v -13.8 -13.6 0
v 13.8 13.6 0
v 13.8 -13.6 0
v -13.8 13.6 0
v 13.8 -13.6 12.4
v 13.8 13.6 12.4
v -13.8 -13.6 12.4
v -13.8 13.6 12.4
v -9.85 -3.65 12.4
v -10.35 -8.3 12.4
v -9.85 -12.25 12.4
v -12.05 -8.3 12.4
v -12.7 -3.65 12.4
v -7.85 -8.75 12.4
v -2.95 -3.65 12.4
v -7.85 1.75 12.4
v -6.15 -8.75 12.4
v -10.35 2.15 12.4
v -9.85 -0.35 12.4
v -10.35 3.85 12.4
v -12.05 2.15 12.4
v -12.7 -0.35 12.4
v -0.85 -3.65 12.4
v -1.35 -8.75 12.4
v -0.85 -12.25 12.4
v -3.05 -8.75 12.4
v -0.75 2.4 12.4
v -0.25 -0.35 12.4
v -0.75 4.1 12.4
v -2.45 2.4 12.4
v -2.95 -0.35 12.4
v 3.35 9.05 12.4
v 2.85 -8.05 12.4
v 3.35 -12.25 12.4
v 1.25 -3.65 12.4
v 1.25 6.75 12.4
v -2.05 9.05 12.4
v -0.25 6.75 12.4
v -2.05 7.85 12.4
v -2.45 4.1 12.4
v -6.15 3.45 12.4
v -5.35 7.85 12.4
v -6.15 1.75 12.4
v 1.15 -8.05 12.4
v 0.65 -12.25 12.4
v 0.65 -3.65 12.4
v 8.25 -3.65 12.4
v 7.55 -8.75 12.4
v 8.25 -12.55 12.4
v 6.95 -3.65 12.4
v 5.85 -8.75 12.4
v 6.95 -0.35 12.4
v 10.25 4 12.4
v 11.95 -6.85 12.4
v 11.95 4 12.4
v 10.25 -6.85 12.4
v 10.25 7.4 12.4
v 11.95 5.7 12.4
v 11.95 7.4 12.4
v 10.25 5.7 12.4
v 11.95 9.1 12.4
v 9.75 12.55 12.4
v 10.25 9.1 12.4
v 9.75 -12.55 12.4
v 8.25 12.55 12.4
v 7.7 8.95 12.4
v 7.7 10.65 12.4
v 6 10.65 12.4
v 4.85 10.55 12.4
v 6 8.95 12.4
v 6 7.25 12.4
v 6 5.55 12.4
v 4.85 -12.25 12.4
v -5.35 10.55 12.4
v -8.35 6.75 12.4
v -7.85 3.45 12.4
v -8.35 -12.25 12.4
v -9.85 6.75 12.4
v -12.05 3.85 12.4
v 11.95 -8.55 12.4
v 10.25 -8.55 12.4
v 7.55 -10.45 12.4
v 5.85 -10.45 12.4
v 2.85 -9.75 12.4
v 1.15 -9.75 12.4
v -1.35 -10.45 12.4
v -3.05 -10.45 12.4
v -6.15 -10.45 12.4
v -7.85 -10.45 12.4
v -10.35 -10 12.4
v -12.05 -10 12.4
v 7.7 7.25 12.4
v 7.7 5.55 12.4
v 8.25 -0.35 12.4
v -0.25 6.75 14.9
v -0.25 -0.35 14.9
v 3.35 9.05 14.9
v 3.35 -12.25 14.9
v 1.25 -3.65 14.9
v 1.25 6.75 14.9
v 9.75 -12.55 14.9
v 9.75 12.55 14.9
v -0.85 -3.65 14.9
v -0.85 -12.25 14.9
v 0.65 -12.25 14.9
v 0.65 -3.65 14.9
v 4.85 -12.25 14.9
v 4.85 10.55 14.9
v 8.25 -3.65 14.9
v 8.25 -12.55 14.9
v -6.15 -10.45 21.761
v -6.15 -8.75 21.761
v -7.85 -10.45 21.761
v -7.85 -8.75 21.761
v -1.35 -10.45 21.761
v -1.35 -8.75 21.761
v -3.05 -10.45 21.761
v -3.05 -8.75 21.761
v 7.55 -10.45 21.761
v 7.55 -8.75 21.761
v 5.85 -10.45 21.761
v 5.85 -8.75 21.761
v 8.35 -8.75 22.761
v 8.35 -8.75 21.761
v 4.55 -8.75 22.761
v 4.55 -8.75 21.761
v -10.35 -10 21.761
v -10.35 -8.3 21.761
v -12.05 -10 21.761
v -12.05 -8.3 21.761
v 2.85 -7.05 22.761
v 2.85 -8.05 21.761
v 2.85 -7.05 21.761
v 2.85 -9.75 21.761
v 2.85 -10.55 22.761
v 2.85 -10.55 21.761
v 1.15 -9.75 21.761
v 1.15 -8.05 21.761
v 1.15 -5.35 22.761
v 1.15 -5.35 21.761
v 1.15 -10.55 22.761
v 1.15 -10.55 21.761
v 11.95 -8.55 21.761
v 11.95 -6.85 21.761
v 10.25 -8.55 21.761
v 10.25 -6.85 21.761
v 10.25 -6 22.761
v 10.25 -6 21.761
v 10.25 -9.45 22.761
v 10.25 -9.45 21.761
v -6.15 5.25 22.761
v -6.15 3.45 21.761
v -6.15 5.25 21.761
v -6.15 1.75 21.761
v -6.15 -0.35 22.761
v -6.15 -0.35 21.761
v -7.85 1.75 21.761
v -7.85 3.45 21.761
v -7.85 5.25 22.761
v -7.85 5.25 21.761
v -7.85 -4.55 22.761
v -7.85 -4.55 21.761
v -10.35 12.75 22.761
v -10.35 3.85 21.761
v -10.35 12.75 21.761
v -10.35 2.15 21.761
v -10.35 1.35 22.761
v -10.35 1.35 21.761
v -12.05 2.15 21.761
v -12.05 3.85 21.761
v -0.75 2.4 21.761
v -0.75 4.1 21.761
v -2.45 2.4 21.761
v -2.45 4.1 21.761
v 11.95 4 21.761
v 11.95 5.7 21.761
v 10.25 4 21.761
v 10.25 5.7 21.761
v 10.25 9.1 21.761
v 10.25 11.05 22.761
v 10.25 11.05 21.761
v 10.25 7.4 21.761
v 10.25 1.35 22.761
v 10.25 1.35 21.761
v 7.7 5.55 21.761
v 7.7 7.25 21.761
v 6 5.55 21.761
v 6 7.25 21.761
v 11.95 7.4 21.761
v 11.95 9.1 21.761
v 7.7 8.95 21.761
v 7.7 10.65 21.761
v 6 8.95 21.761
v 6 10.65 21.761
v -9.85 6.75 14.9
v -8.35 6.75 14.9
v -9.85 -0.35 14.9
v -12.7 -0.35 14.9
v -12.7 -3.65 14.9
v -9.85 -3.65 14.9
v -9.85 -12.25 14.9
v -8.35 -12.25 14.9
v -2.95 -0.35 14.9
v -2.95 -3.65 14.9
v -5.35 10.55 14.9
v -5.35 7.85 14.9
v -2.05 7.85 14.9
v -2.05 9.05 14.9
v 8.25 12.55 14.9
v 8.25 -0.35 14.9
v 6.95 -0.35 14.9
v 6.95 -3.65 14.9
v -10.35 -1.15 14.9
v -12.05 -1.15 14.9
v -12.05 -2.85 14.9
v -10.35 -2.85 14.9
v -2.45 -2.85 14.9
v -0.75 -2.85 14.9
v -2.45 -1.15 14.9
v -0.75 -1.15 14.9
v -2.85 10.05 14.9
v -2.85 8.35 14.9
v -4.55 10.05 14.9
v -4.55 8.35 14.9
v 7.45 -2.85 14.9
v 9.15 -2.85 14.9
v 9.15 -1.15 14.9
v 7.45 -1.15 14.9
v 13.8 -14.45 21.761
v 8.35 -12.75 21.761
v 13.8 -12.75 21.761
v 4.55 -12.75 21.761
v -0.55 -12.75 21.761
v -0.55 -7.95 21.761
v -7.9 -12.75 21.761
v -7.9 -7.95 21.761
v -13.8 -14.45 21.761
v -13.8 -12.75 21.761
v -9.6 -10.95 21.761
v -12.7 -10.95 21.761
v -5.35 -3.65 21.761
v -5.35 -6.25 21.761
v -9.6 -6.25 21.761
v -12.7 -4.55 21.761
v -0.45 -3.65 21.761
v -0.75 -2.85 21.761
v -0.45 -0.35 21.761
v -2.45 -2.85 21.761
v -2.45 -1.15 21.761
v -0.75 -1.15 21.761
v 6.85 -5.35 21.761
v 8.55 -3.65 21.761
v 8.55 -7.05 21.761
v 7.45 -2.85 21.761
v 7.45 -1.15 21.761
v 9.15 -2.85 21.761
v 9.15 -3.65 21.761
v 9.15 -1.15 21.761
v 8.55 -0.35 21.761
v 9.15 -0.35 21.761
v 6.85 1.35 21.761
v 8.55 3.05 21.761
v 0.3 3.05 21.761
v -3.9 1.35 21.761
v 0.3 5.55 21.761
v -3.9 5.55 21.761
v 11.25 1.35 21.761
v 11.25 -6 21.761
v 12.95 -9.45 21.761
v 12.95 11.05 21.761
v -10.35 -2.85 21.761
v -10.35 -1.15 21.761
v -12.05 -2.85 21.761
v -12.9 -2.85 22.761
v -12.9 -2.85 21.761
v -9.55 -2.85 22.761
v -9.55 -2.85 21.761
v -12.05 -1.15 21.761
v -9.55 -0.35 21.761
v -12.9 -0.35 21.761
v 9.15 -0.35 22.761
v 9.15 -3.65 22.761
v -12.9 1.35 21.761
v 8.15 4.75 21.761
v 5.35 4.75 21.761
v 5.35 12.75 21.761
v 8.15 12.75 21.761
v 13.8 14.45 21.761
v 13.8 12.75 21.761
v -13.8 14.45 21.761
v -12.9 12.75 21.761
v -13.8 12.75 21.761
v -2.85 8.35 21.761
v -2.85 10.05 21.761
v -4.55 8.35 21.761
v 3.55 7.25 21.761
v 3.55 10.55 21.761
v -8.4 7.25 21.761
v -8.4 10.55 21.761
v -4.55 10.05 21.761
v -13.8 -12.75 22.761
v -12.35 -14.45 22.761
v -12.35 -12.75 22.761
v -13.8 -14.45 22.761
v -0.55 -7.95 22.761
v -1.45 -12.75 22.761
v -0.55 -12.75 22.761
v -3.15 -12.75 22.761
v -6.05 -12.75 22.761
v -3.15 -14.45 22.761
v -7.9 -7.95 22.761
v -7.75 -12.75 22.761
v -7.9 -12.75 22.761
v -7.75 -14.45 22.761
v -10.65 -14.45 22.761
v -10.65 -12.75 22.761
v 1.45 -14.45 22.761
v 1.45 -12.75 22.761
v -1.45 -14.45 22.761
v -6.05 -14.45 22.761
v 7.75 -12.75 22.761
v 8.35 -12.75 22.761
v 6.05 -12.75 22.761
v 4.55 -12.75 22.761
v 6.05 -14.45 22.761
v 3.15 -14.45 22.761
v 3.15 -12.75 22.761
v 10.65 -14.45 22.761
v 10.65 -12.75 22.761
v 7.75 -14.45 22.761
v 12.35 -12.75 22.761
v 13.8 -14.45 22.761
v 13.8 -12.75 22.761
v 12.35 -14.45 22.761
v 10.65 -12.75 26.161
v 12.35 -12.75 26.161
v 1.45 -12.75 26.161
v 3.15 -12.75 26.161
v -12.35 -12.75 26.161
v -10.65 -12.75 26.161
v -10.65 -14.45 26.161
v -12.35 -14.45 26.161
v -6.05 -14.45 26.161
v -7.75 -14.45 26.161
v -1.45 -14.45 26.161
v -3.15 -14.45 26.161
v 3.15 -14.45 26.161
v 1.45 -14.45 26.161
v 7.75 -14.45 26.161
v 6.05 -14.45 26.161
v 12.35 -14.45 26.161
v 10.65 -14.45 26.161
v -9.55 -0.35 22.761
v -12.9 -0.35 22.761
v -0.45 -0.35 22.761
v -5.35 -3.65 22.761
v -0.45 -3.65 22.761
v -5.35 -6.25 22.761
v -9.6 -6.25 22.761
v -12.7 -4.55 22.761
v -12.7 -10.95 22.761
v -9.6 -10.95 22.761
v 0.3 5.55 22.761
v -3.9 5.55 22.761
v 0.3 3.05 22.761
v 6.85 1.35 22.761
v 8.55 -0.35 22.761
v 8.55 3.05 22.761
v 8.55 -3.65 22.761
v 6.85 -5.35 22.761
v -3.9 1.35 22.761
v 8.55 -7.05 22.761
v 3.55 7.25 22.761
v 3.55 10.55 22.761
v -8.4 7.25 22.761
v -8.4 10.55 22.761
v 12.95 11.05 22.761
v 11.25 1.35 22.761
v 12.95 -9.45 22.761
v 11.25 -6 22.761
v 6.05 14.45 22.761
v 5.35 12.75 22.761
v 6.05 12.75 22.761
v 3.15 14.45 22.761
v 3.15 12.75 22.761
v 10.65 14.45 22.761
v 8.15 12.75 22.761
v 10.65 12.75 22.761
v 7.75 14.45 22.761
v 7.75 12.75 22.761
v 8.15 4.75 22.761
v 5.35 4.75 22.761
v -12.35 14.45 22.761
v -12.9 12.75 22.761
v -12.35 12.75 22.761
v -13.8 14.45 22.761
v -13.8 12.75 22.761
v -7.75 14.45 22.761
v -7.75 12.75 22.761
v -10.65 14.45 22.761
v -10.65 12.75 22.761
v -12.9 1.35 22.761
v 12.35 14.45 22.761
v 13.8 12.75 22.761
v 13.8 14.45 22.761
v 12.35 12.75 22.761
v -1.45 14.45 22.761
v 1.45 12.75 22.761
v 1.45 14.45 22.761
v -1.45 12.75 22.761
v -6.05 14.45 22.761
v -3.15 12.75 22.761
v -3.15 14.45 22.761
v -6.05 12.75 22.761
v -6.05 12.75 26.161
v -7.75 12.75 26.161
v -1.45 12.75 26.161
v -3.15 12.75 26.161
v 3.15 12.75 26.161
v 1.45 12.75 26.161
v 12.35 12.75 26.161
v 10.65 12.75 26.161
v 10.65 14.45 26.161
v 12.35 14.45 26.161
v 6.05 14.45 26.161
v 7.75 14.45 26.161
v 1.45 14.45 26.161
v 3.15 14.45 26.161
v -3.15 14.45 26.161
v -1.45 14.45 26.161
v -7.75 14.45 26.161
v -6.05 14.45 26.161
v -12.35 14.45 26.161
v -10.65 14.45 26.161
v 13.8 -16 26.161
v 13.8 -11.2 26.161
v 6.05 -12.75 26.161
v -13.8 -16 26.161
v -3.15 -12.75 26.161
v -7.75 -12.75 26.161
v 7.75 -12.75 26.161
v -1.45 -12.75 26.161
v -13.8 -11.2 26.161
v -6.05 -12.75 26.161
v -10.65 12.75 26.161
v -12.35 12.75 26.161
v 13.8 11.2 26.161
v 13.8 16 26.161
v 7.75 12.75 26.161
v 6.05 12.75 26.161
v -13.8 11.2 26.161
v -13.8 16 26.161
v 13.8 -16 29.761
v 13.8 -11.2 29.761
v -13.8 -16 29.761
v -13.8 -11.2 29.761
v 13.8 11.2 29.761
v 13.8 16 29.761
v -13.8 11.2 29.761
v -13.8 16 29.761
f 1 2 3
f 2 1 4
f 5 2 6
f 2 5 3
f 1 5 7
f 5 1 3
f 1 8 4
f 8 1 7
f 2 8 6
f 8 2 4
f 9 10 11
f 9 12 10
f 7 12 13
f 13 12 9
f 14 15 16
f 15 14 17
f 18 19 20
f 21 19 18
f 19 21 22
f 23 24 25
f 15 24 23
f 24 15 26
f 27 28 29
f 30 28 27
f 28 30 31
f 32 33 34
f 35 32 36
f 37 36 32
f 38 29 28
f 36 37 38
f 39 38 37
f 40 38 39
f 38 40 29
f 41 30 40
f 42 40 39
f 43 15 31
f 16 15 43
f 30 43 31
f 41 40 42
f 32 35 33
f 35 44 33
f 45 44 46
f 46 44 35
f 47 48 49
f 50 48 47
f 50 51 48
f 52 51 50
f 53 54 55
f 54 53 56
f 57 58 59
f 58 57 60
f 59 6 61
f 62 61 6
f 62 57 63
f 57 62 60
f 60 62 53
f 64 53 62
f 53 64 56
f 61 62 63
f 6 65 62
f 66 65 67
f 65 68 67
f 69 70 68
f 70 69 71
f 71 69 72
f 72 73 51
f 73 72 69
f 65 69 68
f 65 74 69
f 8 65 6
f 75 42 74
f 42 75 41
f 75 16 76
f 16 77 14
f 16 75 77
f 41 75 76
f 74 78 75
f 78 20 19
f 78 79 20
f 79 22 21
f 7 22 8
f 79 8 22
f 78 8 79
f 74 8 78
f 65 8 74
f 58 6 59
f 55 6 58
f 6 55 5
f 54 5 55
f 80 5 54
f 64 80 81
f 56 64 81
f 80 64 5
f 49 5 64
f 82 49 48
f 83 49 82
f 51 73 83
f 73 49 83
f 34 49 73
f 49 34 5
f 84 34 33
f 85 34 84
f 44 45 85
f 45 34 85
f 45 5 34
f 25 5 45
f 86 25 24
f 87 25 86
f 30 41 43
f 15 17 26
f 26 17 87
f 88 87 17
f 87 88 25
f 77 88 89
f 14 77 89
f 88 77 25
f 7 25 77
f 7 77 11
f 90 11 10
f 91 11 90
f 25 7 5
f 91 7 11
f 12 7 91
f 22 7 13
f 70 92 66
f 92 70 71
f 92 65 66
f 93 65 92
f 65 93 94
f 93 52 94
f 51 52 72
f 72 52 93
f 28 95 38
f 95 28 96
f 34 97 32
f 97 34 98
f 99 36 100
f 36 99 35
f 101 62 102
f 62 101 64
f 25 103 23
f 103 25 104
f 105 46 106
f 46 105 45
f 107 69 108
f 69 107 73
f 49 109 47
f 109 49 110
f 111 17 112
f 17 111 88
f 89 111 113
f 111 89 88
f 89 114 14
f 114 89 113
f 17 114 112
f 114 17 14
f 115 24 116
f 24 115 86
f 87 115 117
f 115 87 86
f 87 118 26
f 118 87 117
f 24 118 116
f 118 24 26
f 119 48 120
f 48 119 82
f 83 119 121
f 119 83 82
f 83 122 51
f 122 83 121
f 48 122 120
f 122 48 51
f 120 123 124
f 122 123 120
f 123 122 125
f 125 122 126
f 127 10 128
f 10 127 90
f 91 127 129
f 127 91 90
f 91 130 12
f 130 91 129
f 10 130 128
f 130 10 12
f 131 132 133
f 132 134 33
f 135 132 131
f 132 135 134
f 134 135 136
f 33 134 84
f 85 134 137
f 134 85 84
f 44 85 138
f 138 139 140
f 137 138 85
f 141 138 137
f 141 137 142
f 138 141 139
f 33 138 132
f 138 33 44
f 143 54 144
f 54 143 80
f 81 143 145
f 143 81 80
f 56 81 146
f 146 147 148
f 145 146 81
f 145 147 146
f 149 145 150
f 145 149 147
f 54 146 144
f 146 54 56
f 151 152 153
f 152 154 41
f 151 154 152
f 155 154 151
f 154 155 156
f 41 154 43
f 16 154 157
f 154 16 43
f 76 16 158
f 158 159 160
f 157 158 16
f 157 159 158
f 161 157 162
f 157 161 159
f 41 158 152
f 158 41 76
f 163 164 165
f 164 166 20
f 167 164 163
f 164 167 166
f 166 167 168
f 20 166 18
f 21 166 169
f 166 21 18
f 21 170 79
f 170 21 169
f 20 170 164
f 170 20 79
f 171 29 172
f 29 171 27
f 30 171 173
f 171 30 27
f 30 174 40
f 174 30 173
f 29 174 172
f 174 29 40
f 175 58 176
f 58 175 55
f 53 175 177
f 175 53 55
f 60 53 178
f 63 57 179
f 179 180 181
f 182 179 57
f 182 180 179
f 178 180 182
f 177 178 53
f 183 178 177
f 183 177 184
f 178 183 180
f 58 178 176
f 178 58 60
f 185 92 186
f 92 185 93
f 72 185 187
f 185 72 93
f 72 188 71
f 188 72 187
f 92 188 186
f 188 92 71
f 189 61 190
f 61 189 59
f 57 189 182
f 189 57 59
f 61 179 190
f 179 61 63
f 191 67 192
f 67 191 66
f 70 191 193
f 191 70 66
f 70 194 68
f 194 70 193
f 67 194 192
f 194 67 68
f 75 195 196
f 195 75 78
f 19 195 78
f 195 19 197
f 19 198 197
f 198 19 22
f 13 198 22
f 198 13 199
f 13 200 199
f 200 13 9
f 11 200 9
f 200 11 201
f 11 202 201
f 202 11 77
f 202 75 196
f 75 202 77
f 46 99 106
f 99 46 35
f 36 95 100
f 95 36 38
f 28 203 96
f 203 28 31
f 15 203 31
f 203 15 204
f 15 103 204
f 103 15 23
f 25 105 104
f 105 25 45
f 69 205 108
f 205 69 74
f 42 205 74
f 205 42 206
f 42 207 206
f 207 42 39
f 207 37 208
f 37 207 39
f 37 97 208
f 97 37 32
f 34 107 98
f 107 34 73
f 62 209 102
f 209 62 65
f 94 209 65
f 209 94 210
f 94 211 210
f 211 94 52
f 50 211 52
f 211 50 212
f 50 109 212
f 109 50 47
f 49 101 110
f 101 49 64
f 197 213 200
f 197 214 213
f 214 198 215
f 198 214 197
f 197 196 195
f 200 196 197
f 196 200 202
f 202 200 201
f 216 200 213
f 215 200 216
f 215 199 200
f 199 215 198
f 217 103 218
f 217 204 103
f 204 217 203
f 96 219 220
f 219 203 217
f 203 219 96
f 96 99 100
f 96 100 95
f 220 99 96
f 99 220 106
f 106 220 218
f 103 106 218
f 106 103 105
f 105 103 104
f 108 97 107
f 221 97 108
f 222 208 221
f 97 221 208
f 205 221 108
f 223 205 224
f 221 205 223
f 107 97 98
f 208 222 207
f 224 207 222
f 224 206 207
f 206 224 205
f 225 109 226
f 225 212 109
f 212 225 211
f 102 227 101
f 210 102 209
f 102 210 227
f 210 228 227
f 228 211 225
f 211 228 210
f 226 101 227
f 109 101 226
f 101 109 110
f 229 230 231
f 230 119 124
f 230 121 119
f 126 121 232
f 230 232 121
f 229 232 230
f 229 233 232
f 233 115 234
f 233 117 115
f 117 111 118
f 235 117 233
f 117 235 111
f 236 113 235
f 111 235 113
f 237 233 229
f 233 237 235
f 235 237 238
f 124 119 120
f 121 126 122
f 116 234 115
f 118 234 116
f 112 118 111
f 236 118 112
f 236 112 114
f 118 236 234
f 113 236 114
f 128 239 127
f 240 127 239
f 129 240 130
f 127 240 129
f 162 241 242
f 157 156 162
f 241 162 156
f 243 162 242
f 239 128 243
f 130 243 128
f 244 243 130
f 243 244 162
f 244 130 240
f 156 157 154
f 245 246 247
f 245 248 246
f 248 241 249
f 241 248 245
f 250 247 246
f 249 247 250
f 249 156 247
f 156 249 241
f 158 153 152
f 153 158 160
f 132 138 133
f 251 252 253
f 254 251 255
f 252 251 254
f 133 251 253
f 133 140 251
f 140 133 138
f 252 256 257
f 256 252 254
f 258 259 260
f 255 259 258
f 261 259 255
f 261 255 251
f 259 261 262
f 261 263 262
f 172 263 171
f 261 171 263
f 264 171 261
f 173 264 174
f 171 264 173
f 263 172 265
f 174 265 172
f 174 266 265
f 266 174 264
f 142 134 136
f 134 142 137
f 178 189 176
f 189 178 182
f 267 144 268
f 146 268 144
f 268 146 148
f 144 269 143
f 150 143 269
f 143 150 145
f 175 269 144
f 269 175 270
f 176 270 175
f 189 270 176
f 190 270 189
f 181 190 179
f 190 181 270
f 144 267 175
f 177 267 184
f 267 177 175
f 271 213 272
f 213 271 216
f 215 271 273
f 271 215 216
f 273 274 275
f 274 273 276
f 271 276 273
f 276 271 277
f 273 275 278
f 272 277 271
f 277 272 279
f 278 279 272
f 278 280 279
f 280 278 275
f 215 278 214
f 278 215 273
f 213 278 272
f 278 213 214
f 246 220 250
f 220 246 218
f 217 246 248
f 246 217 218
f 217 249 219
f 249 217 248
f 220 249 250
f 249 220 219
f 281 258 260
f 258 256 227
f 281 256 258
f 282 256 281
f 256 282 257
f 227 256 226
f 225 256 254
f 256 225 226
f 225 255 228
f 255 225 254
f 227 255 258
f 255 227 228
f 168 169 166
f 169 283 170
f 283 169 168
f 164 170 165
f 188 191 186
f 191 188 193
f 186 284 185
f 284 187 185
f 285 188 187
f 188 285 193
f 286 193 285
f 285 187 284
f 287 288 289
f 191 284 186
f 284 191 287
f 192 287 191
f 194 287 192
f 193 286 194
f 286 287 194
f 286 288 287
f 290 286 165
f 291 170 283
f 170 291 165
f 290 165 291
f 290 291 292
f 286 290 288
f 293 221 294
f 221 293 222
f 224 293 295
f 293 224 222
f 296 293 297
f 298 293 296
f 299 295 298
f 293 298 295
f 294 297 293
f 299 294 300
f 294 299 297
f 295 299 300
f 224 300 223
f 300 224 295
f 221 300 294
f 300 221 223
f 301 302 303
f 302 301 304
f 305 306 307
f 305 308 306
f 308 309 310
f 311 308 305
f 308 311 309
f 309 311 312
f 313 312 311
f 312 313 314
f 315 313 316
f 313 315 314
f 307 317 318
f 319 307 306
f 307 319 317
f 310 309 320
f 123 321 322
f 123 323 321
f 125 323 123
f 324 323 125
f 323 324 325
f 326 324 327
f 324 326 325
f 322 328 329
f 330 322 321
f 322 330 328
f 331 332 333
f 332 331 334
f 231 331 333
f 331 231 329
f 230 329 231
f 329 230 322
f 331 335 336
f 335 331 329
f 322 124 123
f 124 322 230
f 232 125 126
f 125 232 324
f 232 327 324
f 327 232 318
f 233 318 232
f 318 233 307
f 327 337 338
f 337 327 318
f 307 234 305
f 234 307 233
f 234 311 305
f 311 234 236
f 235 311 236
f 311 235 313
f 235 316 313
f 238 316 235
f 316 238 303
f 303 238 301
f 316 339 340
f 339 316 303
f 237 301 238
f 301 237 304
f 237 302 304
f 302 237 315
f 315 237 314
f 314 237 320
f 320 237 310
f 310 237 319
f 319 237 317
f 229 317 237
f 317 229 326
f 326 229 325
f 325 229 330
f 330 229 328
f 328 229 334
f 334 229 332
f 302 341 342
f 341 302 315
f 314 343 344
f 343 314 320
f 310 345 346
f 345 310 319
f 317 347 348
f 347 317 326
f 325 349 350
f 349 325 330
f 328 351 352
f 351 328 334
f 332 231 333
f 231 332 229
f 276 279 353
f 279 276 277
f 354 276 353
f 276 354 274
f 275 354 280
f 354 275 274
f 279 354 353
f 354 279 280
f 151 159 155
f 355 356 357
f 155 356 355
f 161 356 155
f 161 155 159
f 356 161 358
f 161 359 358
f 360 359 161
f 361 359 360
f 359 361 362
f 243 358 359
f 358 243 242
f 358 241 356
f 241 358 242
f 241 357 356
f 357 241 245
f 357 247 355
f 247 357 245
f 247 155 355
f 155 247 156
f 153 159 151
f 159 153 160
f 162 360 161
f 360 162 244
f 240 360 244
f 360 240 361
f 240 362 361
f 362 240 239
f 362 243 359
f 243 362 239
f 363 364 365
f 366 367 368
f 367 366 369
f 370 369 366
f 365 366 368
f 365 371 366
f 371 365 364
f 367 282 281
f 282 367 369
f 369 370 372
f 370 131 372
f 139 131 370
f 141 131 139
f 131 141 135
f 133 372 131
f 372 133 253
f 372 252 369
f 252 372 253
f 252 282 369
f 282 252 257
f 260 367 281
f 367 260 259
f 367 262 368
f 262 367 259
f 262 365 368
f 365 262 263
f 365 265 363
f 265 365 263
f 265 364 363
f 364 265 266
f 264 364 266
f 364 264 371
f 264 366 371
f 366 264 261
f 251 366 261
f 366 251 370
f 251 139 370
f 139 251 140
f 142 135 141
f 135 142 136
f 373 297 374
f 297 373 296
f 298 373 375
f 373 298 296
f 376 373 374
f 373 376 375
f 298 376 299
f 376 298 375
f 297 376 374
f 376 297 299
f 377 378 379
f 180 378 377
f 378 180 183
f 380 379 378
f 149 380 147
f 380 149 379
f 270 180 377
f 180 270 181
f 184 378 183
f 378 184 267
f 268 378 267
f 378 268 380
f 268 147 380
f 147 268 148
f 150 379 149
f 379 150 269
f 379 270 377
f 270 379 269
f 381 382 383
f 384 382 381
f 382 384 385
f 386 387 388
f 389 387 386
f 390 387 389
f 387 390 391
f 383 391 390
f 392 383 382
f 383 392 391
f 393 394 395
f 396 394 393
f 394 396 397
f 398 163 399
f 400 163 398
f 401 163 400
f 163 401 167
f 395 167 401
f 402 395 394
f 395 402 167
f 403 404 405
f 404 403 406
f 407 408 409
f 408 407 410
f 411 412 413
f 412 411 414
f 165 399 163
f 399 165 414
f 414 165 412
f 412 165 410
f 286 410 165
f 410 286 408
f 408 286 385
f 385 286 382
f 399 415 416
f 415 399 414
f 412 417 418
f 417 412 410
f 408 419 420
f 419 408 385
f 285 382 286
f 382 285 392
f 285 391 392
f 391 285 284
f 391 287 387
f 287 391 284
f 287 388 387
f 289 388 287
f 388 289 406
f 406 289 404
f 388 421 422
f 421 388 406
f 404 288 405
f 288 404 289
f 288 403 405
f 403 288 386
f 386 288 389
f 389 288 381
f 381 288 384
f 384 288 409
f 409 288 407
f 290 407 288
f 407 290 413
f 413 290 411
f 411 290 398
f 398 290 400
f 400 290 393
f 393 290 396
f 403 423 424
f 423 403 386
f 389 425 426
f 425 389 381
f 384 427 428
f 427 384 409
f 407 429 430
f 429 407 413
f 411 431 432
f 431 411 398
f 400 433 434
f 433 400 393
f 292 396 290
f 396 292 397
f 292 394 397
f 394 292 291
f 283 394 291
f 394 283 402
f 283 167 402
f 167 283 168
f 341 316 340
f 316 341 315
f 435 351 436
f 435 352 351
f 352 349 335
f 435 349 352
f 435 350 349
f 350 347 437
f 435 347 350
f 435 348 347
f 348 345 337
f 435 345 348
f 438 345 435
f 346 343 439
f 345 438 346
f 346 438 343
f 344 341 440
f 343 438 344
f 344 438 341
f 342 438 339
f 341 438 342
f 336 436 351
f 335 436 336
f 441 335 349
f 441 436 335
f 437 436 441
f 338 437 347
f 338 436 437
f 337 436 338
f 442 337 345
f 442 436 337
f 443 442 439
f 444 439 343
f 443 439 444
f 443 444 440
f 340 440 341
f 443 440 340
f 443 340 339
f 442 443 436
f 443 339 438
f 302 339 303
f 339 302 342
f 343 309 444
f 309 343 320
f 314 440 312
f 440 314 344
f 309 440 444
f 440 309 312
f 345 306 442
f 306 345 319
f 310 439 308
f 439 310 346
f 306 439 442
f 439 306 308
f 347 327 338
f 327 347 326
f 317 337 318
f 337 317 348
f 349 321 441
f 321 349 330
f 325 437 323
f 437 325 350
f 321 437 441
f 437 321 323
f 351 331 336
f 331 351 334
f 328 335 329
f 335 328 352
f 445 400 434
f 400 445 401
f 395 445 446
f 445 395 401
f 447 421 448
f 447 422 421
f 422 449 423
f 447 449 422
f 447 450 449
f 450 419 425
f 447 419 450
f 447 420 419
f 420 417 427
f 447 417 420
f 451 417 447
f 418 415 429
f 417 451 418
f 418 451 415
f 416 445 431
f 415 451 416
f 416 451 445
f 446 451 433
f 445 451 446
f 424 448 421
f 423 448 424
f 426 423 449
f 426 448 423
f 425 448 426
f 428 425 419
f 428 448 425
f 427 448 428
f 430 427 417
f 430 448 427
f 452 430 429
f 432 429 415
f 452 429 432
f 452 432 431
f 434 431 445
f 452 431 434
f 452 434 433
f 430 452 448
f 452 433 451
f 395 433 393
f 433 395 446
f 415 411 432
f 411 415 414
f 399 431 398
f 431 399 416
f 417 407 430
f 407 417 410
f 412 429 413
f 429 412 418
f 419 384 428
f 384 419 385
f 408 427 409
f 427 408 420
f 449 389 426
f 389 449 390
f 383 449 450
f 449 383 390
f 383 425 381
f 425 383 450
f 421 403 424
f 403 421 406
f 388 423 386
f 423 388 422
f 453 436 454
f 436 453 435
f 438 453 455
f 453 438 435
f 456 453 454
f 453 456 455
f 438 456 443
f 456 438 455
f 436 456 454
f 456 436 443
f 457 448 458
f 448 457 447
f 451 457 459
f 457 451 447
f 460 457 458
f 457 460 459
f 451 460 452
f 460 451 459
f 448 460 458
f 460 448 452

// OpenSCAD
// Generated by SolidPython 0.4.2 on 2020-09-29 23:22:08
//!OpenSCAD

scale(v = 0.0100000000) {
	translate(v = [-1380, -1360, 0]) {
		union() {
			color(c = [0.4000000000, 0.4000000000, 0.4000000000]) {
				translate(v = [0, 0, 0]) {
					linear_extrude(height = 1000.0000000000) {
						polygon(paths = [[0, 1, 2, 3]], points = [[0, 0], [0, 2720], [2760, 2720], [2760, 0]]);
					}
				}
			}
			color(c = [0.2000000000, 0.6000000000, 0.2000000000]) {
				translate(v = [0, 0, 1000.0000000000]) {
					linear_extrude(height = 120.0000000000) {
						polygon(paths = [[0, 1, 2, 3]], points = [[0, 1305], [0, 2720], [2760, 2720], [2760, 1305]]);
					}
				}
			}
			color(c = [0.4000000000, 0.4000000000, 0.4000000000]) {
				translate(v = [0, 0, 1000.0000000000]) {
					linear_extrude(height = 120.0000000000) {
						polygon(paths = [[0, 1, 2, 3]], points = [[0, 0], [0, 1305], [2760, 1305], [2760, 0]]);
					}
				}
			}
			color(c = [0.9000000000, 0.6000000000, 0.6000000000]) {
				translate(v = [0, 0, 1120.0000000000]) {
					linear_extrude(height = 120.0000000000) {
						polygon(paths = [[0, 1, 2, 3]], points = [[135, 1485], [135, 1905], [395, 1905], [395, 1485]]);
					}
				}
			}
			color(c = [0.9000000000, 0.6000000000, 0.6000000000]) {
				translate(v = [0, 0, 1120.0000000000]) {
					linear_extrude(height = 120.0000000000) {
						polygon(paths = [[0, 1, 2, 3]], points = [[545, 1485], [545, 1905], [825, 1905], [825, 1485]]);
					}
				}
			}
			color(c = [0.9000000000, 0.6000000000, 0.6000000000]) {
				translate(v = [0, 0, 1120.0000000000]) {
					linear_extrude(height = 120.0000000000) {
						polygon(paths = [[0, 1, 2, 3]], points = [[1095, 1485], [1095, 1905], [1355, 1905], [1355, 1485]]);
					}
				}
			}
			color(c = [0.9000000000, 0.6000000000, 0.6000000000]) {
				translate(v = [0, 0, 1120.0000000000]) {
					linear_extrude(height = 120.0000000000) {
						polygon(paths = [[0, 1, 2, 3]], points = [[1505, 1485], [1505, 1905], [1715, 1905], [1715, 1485]]);
					}
				}
			}
			color(c = [0.9000000000, 0.6000000000, 0.6000000000]) {
				translate(v = [0, 0, 1120.0000000000]) {
					linear_extrude(height = 120.0000000000) {
						polygon(paths = [[0, 1, 2, 3, 4, 5]], points = [[1865, 1485], [1865, 1905], [1940, 1905], [1940, 2485], [2205, 2485], [2205, 1485]]);
					}
				}
			}
			color(c = [0.9000000000, 0.6000000000, 0.6000000000]) {
				translate(v = [0, 0, 1120.0000000000]) {
					linear_extrude(height = 120.0000000000) {
						polygon(paths = [[0, 1, 2, 3]], points = [[2355, 1485], [2355, 2485], [2625, 2485], [2625, 1485]]);
					}
				}
			}
			color(c = [0.9000000000, 0.6000000000, 0.9000000000]) {
				translate(v = [0, 0, 1120.0000000000]) {
					linear_extrude(height = 120.0000000000) {
						polygon(paths = [[0, 1, 2, 3]], points = [[135, 265], [135, 685], [395, 685], [395, 265]]);
					}
				}
			}
			color(c = [0.9000000000, 0.6000000000, 0.9000000000]) {
				translate(v = [0, 0, 1120.0000000000]) {
					linear_extrude(height = 120.0000000000) {
						polygon(paths = [[0, 1, 2, 3]], points = [[545, 265], [545, 685], [1295, 685], [1295, 265]]);
					}
				}
			}
			color(c = [0.9000000000, 0.6000000000, 0.9000000000]) {
				translate(v = [0, 0, 1120.0000000000]) {
					linear_extrude(height = 120.0000000000) {
						polygon(paths = [[0, 1, 2, 3]], points = [[1445, 265], [1445, 685], [1715, 685], [1715, 265]]);
					}
				}
			}
			color(c = [0.9000000000, 0.6000000000, 0.9000000000]) {
				translate(v = [0, 0, 1120.0000000000]) {
					linear_extrude(height = 120.0000000000) {
						polygon(paths = [[0, 1, 2, 3, 4, 5, 6, 7]], points = [[1940, 235], [1940, 265], [1865, 265], [1865, 685], [1940, 685], [1940, 885], [2205, 885], [2205, 235]]);
					}
				}
			}
			color(c = [0.9000000000, 0.6000000000, 0.9000000000]) {
				translate(v = [0, 0, 1120.0000000000]) {
					linear_extrude(height = 120.0000000000) {
						polygon(paths = [[0, 1, 2, 3]], points = [[2355, 235], [2355, 885], [2625, 885], [2625, 235]]);
					}
				}
			}
			color(c = [0.2000000000, 0.6000000000, 0.2000000000]) {
				translate(v = [0, 0, 1120.0000000000]) {
					linear_extrude(height = 120.0000000000) {
						difference() {
							polygon(paths = [[0, 1, 2, 3]], points = [[0, 1305], [0, 2720], [2760, 2720], [2760, 1305]]);
							polygon(paths = [[0, 1, 2, 3]], points = [[135, 1485], [395, 1485], [395, 1905], [135, 1905]]);
							polygon(paths = [[0, 1, 2, 3]], points = [[545, 1485], [825, 1485], [825, 1905], [545, 1905]]);
							polygon(paths = [[0, 1, 2, 3]], points = [[1095, 1485], [1355, 1485], [1355, 1905], [1095, 1905]]);
							polygon(paths = [[0, 1, 2, 3]], points = [[1505, 1485], [1715, 1485], [1715, 1905], [1505, 1905]]);
							polygon(paths = [[0, 1, 2, 3]], points = [[2355, 1485], [2625, 1485], [2625, 2485], [2355, 2485]]);
							polygon(paths = [[0, 1, 2, 3, 4, 5]], points = [[1865, 1485], [2205, 1485], [2205, 2485], [1940, 2485], [1940, 1905], [1865, 1905]]);
						}
					}
				}
			}
			color(c = [0.4000000000, 0.4000000000, 0.4000000000]) {
				translate(v = [0, 0, 1120.0000000000]) {
					linear_extrude(height = 120.0000000000) {
						difference() {
							polygon(paths = [[0, 1, 2, 3]], points = [[0, 0], [0, 1305], [2760, 1305], [2760, 0]]);
							polygon(paths = [[0, 1, 2, 3]], points = [[2355, 235], [2625, 235], [2625, 885], [2355, 885]]);
							polygon(paths = [[0, 1, 2, 3]], points = [[135, 265], [395, 265], [395, 685], [135, 685]]);
							polygon(paths = [[0, 1, 2, 3]], points = [[545, 265], [1295, 265], [1295, 685], [545, 685]]);
							polygon(paths = [[0, 1, 2, 3]], points = [[1445, 265], [1715, 265], [1715, 685], [1445, 685]]);
							polygon(paths = [[0, 1, 2, 3, 4, 5, 6, 7]], points = [[1940, 235], [2205, 235], [2205, 885], [1940, 885], [1940, 685], [1865, 685], [1865, 265], [1940, 265]]);
						}
					}
				}
			}
			color(c = [0.1000000000, 0.1000000000, 0.1000000000]) {
				translate(v = [0, 0, 1240.0000000000]) {
					linear_extrude(height = 70.0000000000) {
						polygon(paths = [[0, 1, 2, 3]], points = [[595, 315], [595, 485], [765, 485], [765, 315]]);
					}
				}
			}
			color(c = [0.1000000000, 0.1000000000, 0.1000000000]) {
				translate(v = [0, 0, 1240.0000000000]) {
					linear_extrude(height = 70.0000000000) {
						polygon(paths = [[0, 1, 2, 3]], points = [[1075, 315], [1075, 485], [1245, 485], [1245, 315]]);
					}
				}
			}
			color(c = [0.1000000000, 0.1000000000, 0.1000000000]) {
				translate(v = [0, 0, 1240.0000000000]) {
					linear_extrude(height = 70.0000000000) {
						polygon(paths = [[0, 1, 2, 3]], points = [[1965, 315], [1965, 485], [2135, 485], [2135, 315]]);
					}
				}
			}
			color(c = [0.1000000000, 0.1000000000, 0.1000000000]) {
				translate(v = [0, 0, 1240.0000000000]) {
					linear_extrude(height = 70.0000000000) {
						polygon(paths = [[0, 1, 2, 3]], points = [[175, 360], [175, 530], [345, 530], [345, 360]]);
					}
				}
			}
			color(c = [0.1000000000, 0.1000000000, 0.1000000000]) {
				translate(v = [0, 0, 1240.0000000000]) {
					linear_extrude(height = 70.0000000000) {
						polygon(paths = [[0, 1, 2, 3]], points = [[1495, 385], [1495, 555], [1665, 555], [1665, 385]]);
					}
				}
			}
			color(c = [0.1000000000, 0.1000000000, 0.1000000000]) {
				translate(v = [0, 0, 1240.0000000000]) {
					linear_extrude(height = 70.0000000000) {
						polygon(paths = [[0, 1, 2, 3]], points = [[2405, 505], [2405, 675], [2575, 675], [2575, 505]]);
					}
				}
			}
			color(c = [0.1000000000, 0.1000000000, 0.1000000000]) {
				translate(v = [0, 0, 1240.0000000000]) {
					linear_extrude(height = 70.0000000000) {
						polygon(paths = [[0, 1, 2, 3]], points = [[595, 1535], [595, 1705], [765, 1705], [765, 1535]]);
					}
				}
			}
			color(c = [0.1000000000, 0.1000000000, 0.1000000000]) {
				translate(v = [0, 0, 1240.0000000000]) {
					linear_extrude(height = 70.0000000000) {
						polygon(paths = [[0, 1, 2, 3]], points = [[175, 1575], [175, 1745], [345, 1745], [345, 1575]]);
					}
				}
			}
			color(c = [0.1000000000, 0.1000000000, 0.1000000000]) {
				translate(v = [0, 0, 1240.0000000000]) {
					linear_extrude(height = 70.0000000000) {
						polygon(paths = [[0, 1, 2, 3]], points = [[1135, 1600], [1135, 1770], [1305, 1770], [1305, 1600]]);
					}
				}
			}
			color(c = [0.1000000000, 0.1000000000, 0.1000000000]) {
				translate(v = [0, 0, 1240.0000000000]) {
					linear_extrude(height = 70.0000000000) {
						polygon(paths = [[0, 1, 2, 3]], points = [[2405, 1760], [2405, 1930], [2575, 1930], [2575, 1760]]);
					}
				}
			}
			color(c = [0.1000000000, 0.1000000000, 0.1000000000]) {
				translate(v = [0, 0, 1240.0000000000]) {
					linear_extrude(height = 70.0000000000) {
						polygon(paths = [[0, 1, 2, 3]], points = [[1980, 1915], [1980, 2085], [2150, 2085], [2150, 1915]]);
					}
				}
			}
			color(c = [0.1000000000, 0.1000000000, 0.1000000000]) {
				translate(v = [0, 0, 1240.0000000000]) {
					linear_extrude(height = 70.0000000000) {
						polygon(paths = [[0, 1, 2, 3]], points = [[2405, 2100], [2405, 2270], [2575, 2270], [2575, 2100]]);
					}
				}
			}
			color(c = [0.1000000000, 0.1000000000, 0.1000000000]) {
				translate(v = [0, 0, 1240.0000000000]) {
					linear_extrude(height = 70.0000000000) {
						polygon(paths = [[0, 1, 2, 3]], points = [[1980, 2255], [1980, 2425], [2150, 2425], [2150, 2255]]);
					}
				}
			}
			color(c = [1.0000000000, 1.0000000000, 1.0000000000]) {
				translate(v = [0, 0, 1240.0000000000]) {
					linear_extrude(height = 70.0000000000) {
						polygon(paths = [[0, 1, 2, 3, 4, 5, 6, 7]], points = [[395, 135], [395, 995], [110, 995], [110, 1325], [395, 1325], [395, 2035], [545, 2035], [545, 135]]);
					}
				}
			}
			color(c = [1.0000000000, 1.0000000000, 1.0000000000]) {
				translate(v = [0, 0, 1240.0000000000]) {
					linear_extrude(height = 70.0000000000) {
						polygon(paths = [[0, 1, 2, 3, 4, 5, 6, 7, 8, 9]], points = [[1295, 135], [1295, 995], [1085, 995], [1085, 1325], [1355, 1325], [1355, 2035], [1505, 2035], [1505, 995], [1445, 995], [1445, 135]]);
					}
				}
			}
			color(c = [1.0000000000, 1.0000000000, 1.0000000000]) {
				translate(v = [0, 0, 1240.0000000000]) {
					linear_extrude(height = 70.0000000000) {
						polygon(paths = [[0, 1, 2, 3, 4, 5, 6, 7]], points = [[1715, 135], [1715, 2265], [1175, 2265], [1175, 2145], [845, 2145], [845, 2415], [1865, 2415], [1865, 135]]);
					}
				}
			}
			color(c = [1.0000000000, 1.0000000000, 1.0000000000]) {
				translate(v = [0, 0, 1240.0000000000]) {
					linear_extrude(height = 70.0000000000) {
						polygon(paths = [[0, 1, 2, 3, 4, 5, 6, 7]], points = [[2205, 105], [2205, 995], [2075, 995], [2075, 1325], [2205, 1325], [2205, 2615], [2355, 2615], [2355, 105]]);
					}
				}
			}
			color(c = [0.1000000000, 0.1000000000, 0.1000000000]) {
				translate(v = [0, 0, 1310.0000000000]) {
					linear_extrude(height = 180.0000000000) {
						polygon(paths = [[0, 1, 2, 3]], points = [[595, 315], [595, 485], [765, 485], [765, 315]]);
					}
				}
			}
			color(c = [0.1000000000, 0.1000000000, 0.1000000000]) {
				translate(v = [0, 0, 1310.0000000000]) {
					linear_extrude(height = 180.0000000000) {
						polygon(paths = [[0, 1, 2, 3]], points = [[1075, 315], [1075, 485], [1245, 485], [1245, 315]]);
					}
				}
			}
			color(c = [0.1000000000, 0.1000000000, 0.1000000000]) {
				translate(v = [0, 0, 1310.0000000000]) {
					linear_extrude(height = 180.0000000000) {
						polygon(paths = [[0, 1, 2, 3]], points = [[1965, 315], [1965, 485], [2135, 485], [2135, 315]]);
					}
				}
			}
			color(c = [0.1000000000, 0.1000000000, 0.1000000000]) {
				translate(v = [0, 0, 1310.0000000000]) {
					linear_extrude(height = 180.0000000000) {
						polygon(paths = [[0, 1, 2, 3]], points = [[175, 360], [175, 530], [345, 530], [345, 360]]);
					}
				}
			}
			color(c = [0.1000000000, 0.1000000000, 0.1000000000]) {
				translate(v = [0, 0, 1310.0000000000]) {
					linear_extrude(height = 180.0000000000) {
						polygon(paths = [[0, 1, 2, 3]], points = [[1495, 385], [1495, 555], [1665, 555], [1665, 385]]);
					}
				}
			}
			color(c = [0.1000000000, 0.1000000000, 0.1000000000]) {
				translate(v = [0, 0, 1310.0000000000]) {
					linear_extrude(height = 180.0000000000) {
						polygon(paths = [[0, 1, 2, 3]], points = [[2405, 505], [2405, 675], [2575, 675], [2575, 505]]);
					}
				}
			}
			color(c = [0.1000000000, 0.1000000000, 0.1000000000]) {
				translate(v = [0, 0, 1310.0000000000]) {
					linear_extrude(height = 180.0000000000) {
						polygon(paths = [[0, 1, 2, 3]], points = [[595, 1535], [595, 1705], [765, 1705], [765, 1535]]);
					}
				}
			}
			color(c = [0.1000000000, 0.1000000000, 0.1000000000]) {
				translate(v = [0, 0, 1310.0000000000]) {
					linear_extrude(height = 180.0000000000) {
						polygon(paths = [[0, 1, 2, 3]], points = [[175, 1575], [175, 1745], [345, 1745], [345, 1575]]);
					}
				}
			}
			color(c = [0.1000000000, 0.1000000000, 0.1000000000]) {
				translate(v = [0, 0, 1310.0000000000]) {
					linear_extrude(height = 180.0000000000) {
						polygon(paths = [[0, 1, 2, 3]], points = [[1135, 1600], [1135, 1770], [1305, 1770], [1305, 1600]]);
					}
				}
			}
			color(c = [0.1000000000, 0.1000000000, 0.1000000000]) {
				translate(v = [0, 0, 1310.0000000000]) {
					linear_extrude(height = 180.0000000000) {
						polygon(paths = [[0, 1, 2, 3]], points = [[2405, 1760], [2405, 1930], [2575, 1930], [2575, 1760]]);
					}
				}
			}
			color(c = [0.1000000000, 0.1000000000, 0.1000000000]) {
				translate(v = [0, 0, 1310.0000000000]) {
					linear_extrude(height = 180.0000000000) {
						polygon(paths = [[0, 1, 2, 3]], points = [[1980, 1915], [1980, 2085], [2150, 2085], [2150, 1915]]);
					}
				}
			}
			color(c = [0.1000000000, 0.1000000000, 0.1000000000]) {
				translate(v = [0, 0, 1310.0000000000]) {
					linear_extrude(height = 180.0000000000) {
						polygon(paths = [[0, 1, 2, 3]], points = [[2405, 2100], [2405, 2270], [2575, 2270], [2575, 2100]]);
					}
				}
			}
			color(c = [0.1000000000, 0.1000000000, 0.1000000000]) {
				translate(v = [0, 0, 1310.0000000000]) {
					linear_extrude(height = 180.0000000000) {
						polygon(paths = [[0, 1, 2, 3]], points = [[1980, 2255], [1980, 2425], [2150, 2425], [2150, 2255]]);
					}
				}
			}
			color(c = [0.7000000000, 0, 0]) {
				translate(v = [0, 0, 1310.0000000000]) {
					linear_extrude(height = 180.0000000000) {
						polygon(paths = [[0, 1, 2, 3, 4, 5, 6, 7]], points = [[395, 135], [395, 995], [110, 995], [110, 1325], [395, 1325], [395, 2035], [545, 2035], [545, 135]]);
					}
				}
			}
			color(c = [0.7000000000, 0, 0]) {
				translate(v = [0, 0, 1310.0000000000]) {
					linear_extrude(height = 180.0000000000) {
						polygon(paths = [[0, 1, 2, 3, 4, 5, 6, 7, 8, 9]], points = [[1295, 135], [1295, 995], [1085, 995], [1085, 1325], [1355, 1325], [1355, 2035], [1505, 2035], [1505, 995], [1445, 995], [1445, 135]]);
					}
				}
			}
			color(c = [0.7000000000, 0, 0]) {
				translate(v = [0, 0, 1310.0000000000]) {
					linear_extrude(height = 180.0000000000) {
						polygon(paths = [[0, 1, 2, 3, 4, 5, 6, 7]], points = [[1715, 135], [1715, 2265], [1175, 2265], [1175, 2145], [845, 2145], [845, 2415], [1865, 2415], [1865, 135]]);
					}
				}
			}
			color(c = [0.7000000000, 0, 0]) {
				translate(v = [0, 0, 1310.0000000000]) {
					linear_extrude(height = 180.0000000000) {
						polygon(paths = [[0, 1, 2, 3, 4, 5, 6, 7]], points = [[2205, 105], [2205, 995], [2075, 995], [2075, 1325], [2205, 1325], [2205, 2615], [2355, 2615], [2355, 105]]);
					}
				}
			}
			color(c = [0.1000000000, 0.1000000000, 0.1000000000]) {
				translate(v = [0, 0, 1490.0000000000]) {
					linear_extrude(height = 686.1000000000) {
						polygon(paths = [[0, 1, 2, 3]], points = [[595, 315], [595, 485], [765, 485], [765, 315]]);
					}
				}
			}
			color(c = [0.1000000000, 0.1000000000, 0.1000000000]) {
				translate(v = [0, 0, 1490.0000000000]) {
					linear_extrude(height = 686.1000000000) {
						polygon(paths = [[0, 1, 2, 3]], points = [[1075, 315], [1075, 485], [1245, 485], [1245, 315]]);
					}
				}
			}
			color(c = [0.1000000000, 0.1000000000, 0.1000000000]) {
				translate(v = [0, 0, 1490.0000000000]) {
					linear_extrude(height = 686.1000000000) {
						polygon(paths = [[0, 1, 2, 3]], points = [[1965, 315], [1965, 485], [2135, 485], [2135, 315]]);
					}
				}
			}
			color(c = [0.1000000000, 0.1000000000, 0.1000000000]) {
				translate(v = [0, 0, 1490.0000000000]) {
					linear_extrude(height = 686.1000000000) {
						polygon(paths = [[0, 1, 2, 3]], points = [[175, 360], [175, 530], [345, 530], [345, 360]]);
					}
				}
			}
			color(c = [0.1000000000, 0.1000000000, 0.1000000000]) {
				translate(v = [0, 0, 1490.0000000000]) {
					linear_extrude(height = 686.1000000000) {
						polygon(paths = [[0, 1, 2, 3]], points = [[1495, 385], [1495, 555], [1665, 555], [1665, 385]]);
					}
				}
			}
			color(c = [0.1000000000, 0.1000000000, 0.1000000000]) {
				translate(v = [0, 0, 1490.0000000000]) {
					linear_extrude(height = 686.1000000000) {
						polygon(paths = [[0, 1, 2, 3]], points = [[2405, 505], [2405, 675], [2575, 675], [2575, 505]]);
					}
				}
			}
			color(c = [0.1000000000, 0.1000000000, 0.1000000000]) {
				translate(v = [0, 0, 1490.0000000000]) {
					linear_extrude(height = 686.1000000000) {
						polygon(paths = [[0, 1, 2, 3]], points = [[175, 1075], [175, 1245], [345, 1245], [345, 1075]]);
					}
				}
			}
			color(c = [0.1000000000, 0.1000000000, 0.1000000000]) {
				translate(v = [0, 0, 1490.0000000000]) {
					linear_extrude(height = 686.1000000000) {
						polygon(paths = [[0, 1, 2, 3]], points = [[1135, 1075], [1135, 1245], [1305, 1245], [1305, 1075]]);
					}
				}
			}
			color(c = [0.1000000000, 0.1000000000, 0.1000000000]) {
				translate(v = [0, 0, 1490.0000000000]) {
					linear_extrude(height = 686.1000000000) {
						polygon(paths = [[0, 1, 2, 3]], points = [[2125, 1075], [2125, 1245], [2295, 1245], [2295, 1075]]);
					}
				}
			}
			color(c = [0.1000000000, 0.1000000000, 0.1000000000]) {
				translate(v = [0, 0, 1490.0000000000]) {
					linear_extrude(height = 686.1000000000) {
						polygon(paths = [[0, 1, 2, 3]], points = [[595, 1535], [595, 1705], [765, 1705], [765, 1535]]);
					}
				}
			}
			color(c = [0.1000000000, 0.1000000000, 0.1000000000]) {
				translate(v = [0, 0, 1490.0000000000]) {
					linear_extrude(height = 686.1000000000) {
						polygon(paths = [[0, 1, 2, 3]], points = [[175, 1575], [175, 1745], [345, 1745], [345, 1575]]);
					}
				}
			}
			color(c = [0.1000000000, 0.1000000000, 0.1000000000]) {
				translate(v = [0, 0, 1490.0000000000]) {
					linear_extrude(height = 686.1000000000) {
						polygon(paths = [[0, 1, 2, 3]], points = [[1135, 1600], [1135, 1770], [1305, 1770], [1305, 1600]]);
					}
				}
			}
			color(c = [0.1000000000, 0.1000000000, 0.1000000000]) {
				translate(v = [0, 0, 1490.0000000000]) {
					linear_extrude(height = 686.1000000000) {
						polygon(paths = [[0, 1, 2, 3]], points = [[2405, 1760], [2405, 1930], [2575, 1930], [2575, 1760]]);
					}
				}
			}
			color(c = [0.1000000000, 0.1000000000, 0.1000000000]) {
				translate(v = [0, 0, 1490.0000000000]) {
					linear_extrude(height = 686.1000000000) {
						polygon(paths = [[0, 1, 2, 3]], points = [[1980, 1915], [1980, 2085], [2150, 2085], [2150, 1915]]);
					}
				}
			}
			color(c = [0.1000000000, 0.1000000000, 0.1000000000]) {
				translate(v = [0, 0, 1490.0000000000]) {
					linear_extrude(height = 686.1000000000) {
						polygon(paths = [[0, 1, 2, 3]], points = [[2405, 2100], [2405, 2270], [2575, 2270], [2575, 2100]]);
					}
				}
			}
			color(c = [0.1000000000, 0.1000000000, 0.1000000000]) {
				translate(v = [0, 0, 1490.0000000000]) {
					linear_extrude(height = 686.1000000000) {
						polygon(paths = [[0, 1, 2, 3]], points = [[925, 2195], [925, 2365], [1095, 2365], [1095, 2195]]);
					}
				}
			}
			color(c = [0.1000000000, 0.1000000000, 0.1000000000]) {
				translate(v = [0, 0, 1490.0000000000]) {
					linear_extrude(height = 686.1000000000) {
						polygon(paths = [[0, 1, 2, 3]], points = [[1980, 2255], [1980, 2425], [2150, 2425], [2150, 2255]]);
					}
				}
			}
			color(c = [0.9000000000, 0.6000000000, 0.6000000000]) {
				translate(v = [0, 0, 2176.1000000000]) {
					linear_extrude(height = 100.0000000000) {
						polygon(paths = [[0, 1, 2, 3, 4, 5, 6, 7, 8, 9, 10, 11]], points = [[0, -85], [0, 85], [590, 85], [590, 565], [1325, 565], [1325, 85], [1835, 85], [1835, 485], [2215, 485], [2215, 85], [2760, 85], [2760, -85]]);
					}
				}
			}
			color(c = [0.9000000000, 0.6000000000, 0.6000000000]) {
				translate(v = [0, 0, 2176.1000000000]) {
					linear_extrude(height = 100.0000000000) {
						polygon(paths = [[0, 1, 2, 3]], points = [[90, 1075], [90, 1325], [425, 1325], [425, 1075]]);
					}
				}
			}
			color(c = [0.9000000000, 0.6000000000, 0.6000000000]) {
				translate(v = [0, 0, 2176.1000000000]) {
					linear_extrude(height = 100.0000000000) {
						polygon(paths = [[0, 1, 2, 3, 4, 5, 6, 7, 8, 9, 10, 11]], points = [[110, 265], [110, 905], [595, 905], [595, 1885], [765, 1885], [765, 1325], [1335, 1325], [1335, 995], [845, 995], [845, 735], [420, 735], [420, 265]]);
					}
				}
			}
			color(c = [0.9000000000, 0.6000000000, 0.6000000000]) {
				translate(v = [0, 0, 2176.1000000000]) {
					linear_extrude(height = 100.0000000000) {
						polygon(paths = [[0, 1, 2, 3, 4, 5, 6, 7, 8, 9, 10, 11, 12, 13, 14, 15]], points = [[1495, 305], [1495, 825], [2065, 825], [2065, 1495], [990, 1495], [990, 1915], [1410, 1915], [1410, 1665], [2235, 1665], [2235, 1325], [2295, 1325], [2295, 995], [2235, 995], [2235, 655], [1665, 655], [1665, 305]]);
					}
				}
			}
			color(c = [0.9000000000, 0.6000000000, 0.6000000000]) {
				translate(v = [0, 0, 2176.1000000000]) {
					linear_extrude(height = 100.0000000000) {
						polygon(paths = [[0, 1, 2, 3]], points = [[540, 2085], [540, 2415], [1735, 2415], [1735, 2085]]);
					}
				}
			}
			color(c = [0.9000000000, 0.6000000000, 0.6000000000]) {
				translate(v = [0, 0, 2176.1000000000]) {
					linear_extrude(height = 100.0000000000) {
						polygon(paths = [[0, 1, 2, 3, 4, 5, 6, 7]], points = [[2405, 415], [2405, 760], [2505, 760], [2505, 1495], [2405, 1495], [2405, 2465], [2675, 2465], [2675, 415]]);
					}
				}
			}
			color(c = [0.9000000000, 0.6000000000, 0.6000000000]) {
				translate(v = [0, 0, 2176.1000000000]) {
					linear_extrude(height = 100.0000000000) {
						polygon(paths = [[0, 1, 2, 3, 4, 5, 6, 7, 8, 9, 10, 11]], points = [[90, 1495], [90, 2635], [0, 2635], [0, 2805], [2760, 2805], [2760, 2635], [2195, 2635], [2195, 1835], [1915, 1835], [1915, 2635], [345, 2635], [345, 1495]]);
					}
				}
			}
			color(c = [0.5000000000, 0.5000000000, 0.5000000000]) {
				translate(v = [0, 0, 2276.1000000000]) {
					linear_extrude(height = 340.0000000000) {
						polygon(paths = [[0, 1, 2, 3]], points = [[145, -85], [145, 85], [315, 85], [315, -85]]);
					}
				}
			}
			color(c = [0.5000000000, 0.5000000000, 0.5000000000]) {
				translate(v = [0, 0, 2276.1000000000]) {
					linear_extrude(height = 340.0000000000) {
						polygon(paths = [[0, 1, 2, 3]], points = [[605, -85], [605, 85], [775, 85], [775, -85]]);
					}
				}
			}
			color(c = [0.5000000000, 0.5000000000, 0.5000000000]) {
				translate(v = [0, 0, 2276.1000000000]) {
					linear_extrude(height = 340.0000000000) {
						polygon(paths = [[0, 1, 2, 3]], points = [[1065, -85], [1065, 85], [1235, 85], [1235, -85]]);
					}
				}
			}
			color(c = [0.5000000000, 0.5000000000, 0.5000000000]) {
				translate(v = [0, 0, 2276.1000000000]) {
					linear_extrude(height = 340.0000000000) {
						polygon(paths = [[0, 1, 2, 3]], points = [[1525, -85], [1525, 85], [1695, 85], [1695, -85]]);
					}
				}
			}
			color(c = [0.5000000000, 0.5000000000, 0.5000000000]) {
				translate(v = [0, 0, 2276.1000000000]) {
					linear_extrude(height = 340.0000000000) {
						polygon(paths = [[0, 1, 2, 3]], points = [[1985, -85], [1985, 85], [2155, 85], [2155, -85]]);
					}
				}
			}
			color(c = [0.5000000000, 0.5000000000, 0.5000000000]) {
				translate(v = [0, 0, 2276.1000000000]) {
					linear_extrude(height = 340.0000000000) {
						polygon(paths = [[0, 1, 2, 3]], points = [[2445, -85], [2445, 85], [2615, 85], [2615, -85]]);
					}
				}
			}
			color(c = [0.5000000000, 0.5000000000, 0.5000000000]) {
				translate(v = [0, 0, 2276.1000000000]) {
					linear_extrude(height = 340.0000000000) {
						polygon(paths = [[0, 1, 2, 3]], points = [[145, 2635], [145, 2805], [315, 2805], [315, 2635]]);
					}
				}
			}
			color(c = [0.5000000000, 0.5000000000, 0.5000000000]) {
				translate(v = [0, 0, 2276.1000000000]) {
					linear_extrude(height = 340.0000000000) {
						polygon(paths = [[0, 1, 2, 3]], points = [[605, 2635], [605, 2805], [775, 2805], [775, 2635]]);
					}
				}
			}
			color(c = [0.5000000000, 0.5000000000, 0.5000000000]) {
				translate(v = [0, 0, 2276.1000000000]) {
					linear_extrude(height = 340.0000000000) {
						polygon(paths = [[0, 1, 2, 3]], points = [[1065, 2635], [1065, 2805], [1235, 2805], [1235, 2635]]);
					}
				}
			}
			color(c = [0.5000000000, 0.5000000000, 0.5000000000]) {
				translate(v = [0, 0, 2276.1000000000]) {
					linear_extrude(height = 340.0000000000) {
						polygon(paths = [[0, 1, 2, 3]], points = [[1525, 2635], [1525, 2805], [1695, 2805], [1695, 2635]]);
					}
				}
			}
			color(c = [0.5000000000, 0.5000000000, 0.5000000000]) {
				translate(v = [0, 0, 2276.1000000000]) {
					linear_extrude(height = 340.0000000000) {
						polygon(paths = [[0, 1, 2, 3]], points = [[1985, 2635], [1985, 2805], [2155, 2805], [2155, 2635]]);
					}
				}
			}
			color(c = [0.5000000000, 0.5000000000, 0.5000000000]) {
				translate(v = [0, 0, 2276.1000000000]) {
					linear_extrude(height = 340.0000000000) {
						polygon(paths = [[0, 1, 2, 3]], points = [[2445, 2635], [2445, 2805], [2615, 2805], [2615, 2635]]);
					}
				}
			}
			color(c = [0.3000000000, 0.3000000000, 1]) {
				translate(v = [0, 0, 2616.1000000000]) {
					linear_extrude(height = 360.0000000000) {
						polygon(paths = [[0, 1, 2, 3]], points = [[0, -240], [0, 240], [2760, 240], [2760, -240]]);
					}
				}
			}
			color(c = [0.3000000000, 0.3000000000, 1]) {
				translate(v = [0, 0, 2616.1000000000]) {
					linear_extrude(height = 360.0000000000) {
						polygon(paths = [[0, 1, 2, 3]], points = [[0, 2480], [0, 2960], [2760, 2960], [2760, 2480]]);
					}
				}
			}
		}
	}
}
